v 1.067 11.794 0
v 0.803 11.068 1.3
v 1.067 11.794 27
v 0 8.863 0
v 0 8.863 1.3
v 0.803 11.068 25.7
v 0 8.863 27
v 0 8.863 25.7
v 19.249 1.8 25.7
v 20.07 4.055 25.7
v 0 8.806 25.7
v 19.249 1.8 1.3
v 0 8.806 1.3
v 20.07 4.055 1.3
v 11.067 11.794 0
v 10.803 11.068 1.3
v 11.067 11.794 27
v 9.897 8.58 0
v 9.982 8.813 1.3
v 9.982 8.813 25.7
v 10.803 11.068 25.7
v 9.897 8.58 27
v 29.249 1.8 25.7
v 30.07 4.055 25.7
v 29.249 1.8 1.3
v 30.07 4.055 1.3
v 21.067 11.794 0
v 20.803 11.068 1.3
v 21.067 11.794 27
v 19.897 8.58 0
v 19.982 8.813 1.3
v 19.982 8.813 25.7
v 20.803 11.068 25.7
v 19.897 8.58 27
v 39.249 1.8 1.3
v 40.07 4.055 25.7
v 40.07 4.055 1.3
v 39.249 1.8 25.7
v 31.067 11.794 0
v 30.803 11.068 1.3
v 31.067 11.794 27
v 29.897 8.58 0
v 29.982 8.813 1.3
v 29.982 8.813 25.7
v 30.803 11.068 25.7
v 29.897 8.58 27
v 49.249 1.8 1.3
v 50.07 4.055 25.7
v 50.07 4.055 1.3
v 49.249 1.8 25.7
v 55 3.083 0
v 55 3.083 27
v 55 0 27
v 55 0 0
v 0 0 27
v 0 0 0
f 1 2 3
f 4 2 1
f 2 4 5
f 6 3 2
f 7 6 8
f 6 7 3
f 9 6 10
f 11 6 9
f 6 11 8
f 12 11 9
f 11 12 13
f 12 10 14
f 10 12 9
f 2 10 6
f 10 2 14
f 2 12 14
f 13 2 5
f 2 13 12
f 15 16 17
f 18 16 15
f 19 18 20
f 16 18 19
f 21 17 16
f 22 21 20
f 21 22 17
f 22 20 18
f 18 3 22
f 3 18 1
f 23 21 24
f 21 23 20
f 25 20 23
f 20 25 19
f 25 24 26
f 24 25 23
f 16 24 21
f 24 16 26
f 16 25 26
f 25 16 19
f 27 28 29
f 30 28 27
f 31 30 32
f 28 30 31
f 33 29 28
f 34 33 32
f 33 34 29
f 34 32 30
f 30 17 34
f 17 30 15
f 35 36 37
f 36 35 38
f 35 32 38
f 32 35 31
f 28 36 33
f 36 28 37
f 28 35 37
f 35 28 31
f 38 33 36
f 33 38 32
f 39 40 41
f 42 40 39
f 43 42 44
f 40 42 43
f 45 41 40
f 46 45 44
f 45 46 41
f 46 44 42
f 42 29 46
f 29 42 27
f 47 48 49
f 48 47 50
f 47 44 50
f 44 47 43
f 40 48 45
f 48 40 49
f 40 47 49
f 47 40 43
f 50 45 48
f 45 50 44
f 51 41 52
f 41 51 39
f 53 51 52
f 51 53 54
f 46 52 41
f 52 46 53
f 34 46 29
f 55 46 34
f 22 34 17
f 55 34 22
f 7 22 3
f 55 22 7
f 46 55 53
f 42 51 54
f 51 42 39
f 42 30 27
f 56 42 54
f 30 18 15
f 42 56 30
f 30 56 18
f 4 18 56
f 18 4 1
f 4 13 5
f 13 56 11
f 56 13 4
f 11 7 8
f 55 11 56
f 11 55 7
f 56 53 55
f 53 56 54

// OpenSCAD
// Number of card slots
cardCount = 4;

// Adding 0 to not show up in thingiverse customizer
y = 15 + 0;
z = 27 + 0;

xSlot = 10 + 0;
ySlot = 3 + 0;

sdCardX = 32 + 0;
sdCardY = 24 + 0;
sdCardZ = 2 + 0;
tol = 0.2 + 0;
angle = -20 + 0;

verticalHolder();

module verticalHolder() {
  difference() {
    cube([(cardCount + 1) * 11, y, z]);
    for (slot = [0 : cardCount ]) {
      translate([xSlot * (slot - 1) + 0.5, y-3, -0.5]) {
        rotate([0, 0, angle]) {
          if (slot == cardCount) {
            cube([50, 20, z + 1]);
          } else {
            cube([xSlot, 20, z + 1]);
          }
        }
      }
      if(slot < cardCount) {
        translate([xSlot * (slot - 1), y, (z - sdCardY)/2 -tol]) {
          rotate([0, 0, angle]) {
            sdCard(tol);
          }
        }
      }
    }
  }
}

module sdCard(tol) {
  rotate([90, 0, 0]) {
    cube([sdCardX, sdCardY + 2 * tol, sdCardZ + 2 * tol]);
  }
}
